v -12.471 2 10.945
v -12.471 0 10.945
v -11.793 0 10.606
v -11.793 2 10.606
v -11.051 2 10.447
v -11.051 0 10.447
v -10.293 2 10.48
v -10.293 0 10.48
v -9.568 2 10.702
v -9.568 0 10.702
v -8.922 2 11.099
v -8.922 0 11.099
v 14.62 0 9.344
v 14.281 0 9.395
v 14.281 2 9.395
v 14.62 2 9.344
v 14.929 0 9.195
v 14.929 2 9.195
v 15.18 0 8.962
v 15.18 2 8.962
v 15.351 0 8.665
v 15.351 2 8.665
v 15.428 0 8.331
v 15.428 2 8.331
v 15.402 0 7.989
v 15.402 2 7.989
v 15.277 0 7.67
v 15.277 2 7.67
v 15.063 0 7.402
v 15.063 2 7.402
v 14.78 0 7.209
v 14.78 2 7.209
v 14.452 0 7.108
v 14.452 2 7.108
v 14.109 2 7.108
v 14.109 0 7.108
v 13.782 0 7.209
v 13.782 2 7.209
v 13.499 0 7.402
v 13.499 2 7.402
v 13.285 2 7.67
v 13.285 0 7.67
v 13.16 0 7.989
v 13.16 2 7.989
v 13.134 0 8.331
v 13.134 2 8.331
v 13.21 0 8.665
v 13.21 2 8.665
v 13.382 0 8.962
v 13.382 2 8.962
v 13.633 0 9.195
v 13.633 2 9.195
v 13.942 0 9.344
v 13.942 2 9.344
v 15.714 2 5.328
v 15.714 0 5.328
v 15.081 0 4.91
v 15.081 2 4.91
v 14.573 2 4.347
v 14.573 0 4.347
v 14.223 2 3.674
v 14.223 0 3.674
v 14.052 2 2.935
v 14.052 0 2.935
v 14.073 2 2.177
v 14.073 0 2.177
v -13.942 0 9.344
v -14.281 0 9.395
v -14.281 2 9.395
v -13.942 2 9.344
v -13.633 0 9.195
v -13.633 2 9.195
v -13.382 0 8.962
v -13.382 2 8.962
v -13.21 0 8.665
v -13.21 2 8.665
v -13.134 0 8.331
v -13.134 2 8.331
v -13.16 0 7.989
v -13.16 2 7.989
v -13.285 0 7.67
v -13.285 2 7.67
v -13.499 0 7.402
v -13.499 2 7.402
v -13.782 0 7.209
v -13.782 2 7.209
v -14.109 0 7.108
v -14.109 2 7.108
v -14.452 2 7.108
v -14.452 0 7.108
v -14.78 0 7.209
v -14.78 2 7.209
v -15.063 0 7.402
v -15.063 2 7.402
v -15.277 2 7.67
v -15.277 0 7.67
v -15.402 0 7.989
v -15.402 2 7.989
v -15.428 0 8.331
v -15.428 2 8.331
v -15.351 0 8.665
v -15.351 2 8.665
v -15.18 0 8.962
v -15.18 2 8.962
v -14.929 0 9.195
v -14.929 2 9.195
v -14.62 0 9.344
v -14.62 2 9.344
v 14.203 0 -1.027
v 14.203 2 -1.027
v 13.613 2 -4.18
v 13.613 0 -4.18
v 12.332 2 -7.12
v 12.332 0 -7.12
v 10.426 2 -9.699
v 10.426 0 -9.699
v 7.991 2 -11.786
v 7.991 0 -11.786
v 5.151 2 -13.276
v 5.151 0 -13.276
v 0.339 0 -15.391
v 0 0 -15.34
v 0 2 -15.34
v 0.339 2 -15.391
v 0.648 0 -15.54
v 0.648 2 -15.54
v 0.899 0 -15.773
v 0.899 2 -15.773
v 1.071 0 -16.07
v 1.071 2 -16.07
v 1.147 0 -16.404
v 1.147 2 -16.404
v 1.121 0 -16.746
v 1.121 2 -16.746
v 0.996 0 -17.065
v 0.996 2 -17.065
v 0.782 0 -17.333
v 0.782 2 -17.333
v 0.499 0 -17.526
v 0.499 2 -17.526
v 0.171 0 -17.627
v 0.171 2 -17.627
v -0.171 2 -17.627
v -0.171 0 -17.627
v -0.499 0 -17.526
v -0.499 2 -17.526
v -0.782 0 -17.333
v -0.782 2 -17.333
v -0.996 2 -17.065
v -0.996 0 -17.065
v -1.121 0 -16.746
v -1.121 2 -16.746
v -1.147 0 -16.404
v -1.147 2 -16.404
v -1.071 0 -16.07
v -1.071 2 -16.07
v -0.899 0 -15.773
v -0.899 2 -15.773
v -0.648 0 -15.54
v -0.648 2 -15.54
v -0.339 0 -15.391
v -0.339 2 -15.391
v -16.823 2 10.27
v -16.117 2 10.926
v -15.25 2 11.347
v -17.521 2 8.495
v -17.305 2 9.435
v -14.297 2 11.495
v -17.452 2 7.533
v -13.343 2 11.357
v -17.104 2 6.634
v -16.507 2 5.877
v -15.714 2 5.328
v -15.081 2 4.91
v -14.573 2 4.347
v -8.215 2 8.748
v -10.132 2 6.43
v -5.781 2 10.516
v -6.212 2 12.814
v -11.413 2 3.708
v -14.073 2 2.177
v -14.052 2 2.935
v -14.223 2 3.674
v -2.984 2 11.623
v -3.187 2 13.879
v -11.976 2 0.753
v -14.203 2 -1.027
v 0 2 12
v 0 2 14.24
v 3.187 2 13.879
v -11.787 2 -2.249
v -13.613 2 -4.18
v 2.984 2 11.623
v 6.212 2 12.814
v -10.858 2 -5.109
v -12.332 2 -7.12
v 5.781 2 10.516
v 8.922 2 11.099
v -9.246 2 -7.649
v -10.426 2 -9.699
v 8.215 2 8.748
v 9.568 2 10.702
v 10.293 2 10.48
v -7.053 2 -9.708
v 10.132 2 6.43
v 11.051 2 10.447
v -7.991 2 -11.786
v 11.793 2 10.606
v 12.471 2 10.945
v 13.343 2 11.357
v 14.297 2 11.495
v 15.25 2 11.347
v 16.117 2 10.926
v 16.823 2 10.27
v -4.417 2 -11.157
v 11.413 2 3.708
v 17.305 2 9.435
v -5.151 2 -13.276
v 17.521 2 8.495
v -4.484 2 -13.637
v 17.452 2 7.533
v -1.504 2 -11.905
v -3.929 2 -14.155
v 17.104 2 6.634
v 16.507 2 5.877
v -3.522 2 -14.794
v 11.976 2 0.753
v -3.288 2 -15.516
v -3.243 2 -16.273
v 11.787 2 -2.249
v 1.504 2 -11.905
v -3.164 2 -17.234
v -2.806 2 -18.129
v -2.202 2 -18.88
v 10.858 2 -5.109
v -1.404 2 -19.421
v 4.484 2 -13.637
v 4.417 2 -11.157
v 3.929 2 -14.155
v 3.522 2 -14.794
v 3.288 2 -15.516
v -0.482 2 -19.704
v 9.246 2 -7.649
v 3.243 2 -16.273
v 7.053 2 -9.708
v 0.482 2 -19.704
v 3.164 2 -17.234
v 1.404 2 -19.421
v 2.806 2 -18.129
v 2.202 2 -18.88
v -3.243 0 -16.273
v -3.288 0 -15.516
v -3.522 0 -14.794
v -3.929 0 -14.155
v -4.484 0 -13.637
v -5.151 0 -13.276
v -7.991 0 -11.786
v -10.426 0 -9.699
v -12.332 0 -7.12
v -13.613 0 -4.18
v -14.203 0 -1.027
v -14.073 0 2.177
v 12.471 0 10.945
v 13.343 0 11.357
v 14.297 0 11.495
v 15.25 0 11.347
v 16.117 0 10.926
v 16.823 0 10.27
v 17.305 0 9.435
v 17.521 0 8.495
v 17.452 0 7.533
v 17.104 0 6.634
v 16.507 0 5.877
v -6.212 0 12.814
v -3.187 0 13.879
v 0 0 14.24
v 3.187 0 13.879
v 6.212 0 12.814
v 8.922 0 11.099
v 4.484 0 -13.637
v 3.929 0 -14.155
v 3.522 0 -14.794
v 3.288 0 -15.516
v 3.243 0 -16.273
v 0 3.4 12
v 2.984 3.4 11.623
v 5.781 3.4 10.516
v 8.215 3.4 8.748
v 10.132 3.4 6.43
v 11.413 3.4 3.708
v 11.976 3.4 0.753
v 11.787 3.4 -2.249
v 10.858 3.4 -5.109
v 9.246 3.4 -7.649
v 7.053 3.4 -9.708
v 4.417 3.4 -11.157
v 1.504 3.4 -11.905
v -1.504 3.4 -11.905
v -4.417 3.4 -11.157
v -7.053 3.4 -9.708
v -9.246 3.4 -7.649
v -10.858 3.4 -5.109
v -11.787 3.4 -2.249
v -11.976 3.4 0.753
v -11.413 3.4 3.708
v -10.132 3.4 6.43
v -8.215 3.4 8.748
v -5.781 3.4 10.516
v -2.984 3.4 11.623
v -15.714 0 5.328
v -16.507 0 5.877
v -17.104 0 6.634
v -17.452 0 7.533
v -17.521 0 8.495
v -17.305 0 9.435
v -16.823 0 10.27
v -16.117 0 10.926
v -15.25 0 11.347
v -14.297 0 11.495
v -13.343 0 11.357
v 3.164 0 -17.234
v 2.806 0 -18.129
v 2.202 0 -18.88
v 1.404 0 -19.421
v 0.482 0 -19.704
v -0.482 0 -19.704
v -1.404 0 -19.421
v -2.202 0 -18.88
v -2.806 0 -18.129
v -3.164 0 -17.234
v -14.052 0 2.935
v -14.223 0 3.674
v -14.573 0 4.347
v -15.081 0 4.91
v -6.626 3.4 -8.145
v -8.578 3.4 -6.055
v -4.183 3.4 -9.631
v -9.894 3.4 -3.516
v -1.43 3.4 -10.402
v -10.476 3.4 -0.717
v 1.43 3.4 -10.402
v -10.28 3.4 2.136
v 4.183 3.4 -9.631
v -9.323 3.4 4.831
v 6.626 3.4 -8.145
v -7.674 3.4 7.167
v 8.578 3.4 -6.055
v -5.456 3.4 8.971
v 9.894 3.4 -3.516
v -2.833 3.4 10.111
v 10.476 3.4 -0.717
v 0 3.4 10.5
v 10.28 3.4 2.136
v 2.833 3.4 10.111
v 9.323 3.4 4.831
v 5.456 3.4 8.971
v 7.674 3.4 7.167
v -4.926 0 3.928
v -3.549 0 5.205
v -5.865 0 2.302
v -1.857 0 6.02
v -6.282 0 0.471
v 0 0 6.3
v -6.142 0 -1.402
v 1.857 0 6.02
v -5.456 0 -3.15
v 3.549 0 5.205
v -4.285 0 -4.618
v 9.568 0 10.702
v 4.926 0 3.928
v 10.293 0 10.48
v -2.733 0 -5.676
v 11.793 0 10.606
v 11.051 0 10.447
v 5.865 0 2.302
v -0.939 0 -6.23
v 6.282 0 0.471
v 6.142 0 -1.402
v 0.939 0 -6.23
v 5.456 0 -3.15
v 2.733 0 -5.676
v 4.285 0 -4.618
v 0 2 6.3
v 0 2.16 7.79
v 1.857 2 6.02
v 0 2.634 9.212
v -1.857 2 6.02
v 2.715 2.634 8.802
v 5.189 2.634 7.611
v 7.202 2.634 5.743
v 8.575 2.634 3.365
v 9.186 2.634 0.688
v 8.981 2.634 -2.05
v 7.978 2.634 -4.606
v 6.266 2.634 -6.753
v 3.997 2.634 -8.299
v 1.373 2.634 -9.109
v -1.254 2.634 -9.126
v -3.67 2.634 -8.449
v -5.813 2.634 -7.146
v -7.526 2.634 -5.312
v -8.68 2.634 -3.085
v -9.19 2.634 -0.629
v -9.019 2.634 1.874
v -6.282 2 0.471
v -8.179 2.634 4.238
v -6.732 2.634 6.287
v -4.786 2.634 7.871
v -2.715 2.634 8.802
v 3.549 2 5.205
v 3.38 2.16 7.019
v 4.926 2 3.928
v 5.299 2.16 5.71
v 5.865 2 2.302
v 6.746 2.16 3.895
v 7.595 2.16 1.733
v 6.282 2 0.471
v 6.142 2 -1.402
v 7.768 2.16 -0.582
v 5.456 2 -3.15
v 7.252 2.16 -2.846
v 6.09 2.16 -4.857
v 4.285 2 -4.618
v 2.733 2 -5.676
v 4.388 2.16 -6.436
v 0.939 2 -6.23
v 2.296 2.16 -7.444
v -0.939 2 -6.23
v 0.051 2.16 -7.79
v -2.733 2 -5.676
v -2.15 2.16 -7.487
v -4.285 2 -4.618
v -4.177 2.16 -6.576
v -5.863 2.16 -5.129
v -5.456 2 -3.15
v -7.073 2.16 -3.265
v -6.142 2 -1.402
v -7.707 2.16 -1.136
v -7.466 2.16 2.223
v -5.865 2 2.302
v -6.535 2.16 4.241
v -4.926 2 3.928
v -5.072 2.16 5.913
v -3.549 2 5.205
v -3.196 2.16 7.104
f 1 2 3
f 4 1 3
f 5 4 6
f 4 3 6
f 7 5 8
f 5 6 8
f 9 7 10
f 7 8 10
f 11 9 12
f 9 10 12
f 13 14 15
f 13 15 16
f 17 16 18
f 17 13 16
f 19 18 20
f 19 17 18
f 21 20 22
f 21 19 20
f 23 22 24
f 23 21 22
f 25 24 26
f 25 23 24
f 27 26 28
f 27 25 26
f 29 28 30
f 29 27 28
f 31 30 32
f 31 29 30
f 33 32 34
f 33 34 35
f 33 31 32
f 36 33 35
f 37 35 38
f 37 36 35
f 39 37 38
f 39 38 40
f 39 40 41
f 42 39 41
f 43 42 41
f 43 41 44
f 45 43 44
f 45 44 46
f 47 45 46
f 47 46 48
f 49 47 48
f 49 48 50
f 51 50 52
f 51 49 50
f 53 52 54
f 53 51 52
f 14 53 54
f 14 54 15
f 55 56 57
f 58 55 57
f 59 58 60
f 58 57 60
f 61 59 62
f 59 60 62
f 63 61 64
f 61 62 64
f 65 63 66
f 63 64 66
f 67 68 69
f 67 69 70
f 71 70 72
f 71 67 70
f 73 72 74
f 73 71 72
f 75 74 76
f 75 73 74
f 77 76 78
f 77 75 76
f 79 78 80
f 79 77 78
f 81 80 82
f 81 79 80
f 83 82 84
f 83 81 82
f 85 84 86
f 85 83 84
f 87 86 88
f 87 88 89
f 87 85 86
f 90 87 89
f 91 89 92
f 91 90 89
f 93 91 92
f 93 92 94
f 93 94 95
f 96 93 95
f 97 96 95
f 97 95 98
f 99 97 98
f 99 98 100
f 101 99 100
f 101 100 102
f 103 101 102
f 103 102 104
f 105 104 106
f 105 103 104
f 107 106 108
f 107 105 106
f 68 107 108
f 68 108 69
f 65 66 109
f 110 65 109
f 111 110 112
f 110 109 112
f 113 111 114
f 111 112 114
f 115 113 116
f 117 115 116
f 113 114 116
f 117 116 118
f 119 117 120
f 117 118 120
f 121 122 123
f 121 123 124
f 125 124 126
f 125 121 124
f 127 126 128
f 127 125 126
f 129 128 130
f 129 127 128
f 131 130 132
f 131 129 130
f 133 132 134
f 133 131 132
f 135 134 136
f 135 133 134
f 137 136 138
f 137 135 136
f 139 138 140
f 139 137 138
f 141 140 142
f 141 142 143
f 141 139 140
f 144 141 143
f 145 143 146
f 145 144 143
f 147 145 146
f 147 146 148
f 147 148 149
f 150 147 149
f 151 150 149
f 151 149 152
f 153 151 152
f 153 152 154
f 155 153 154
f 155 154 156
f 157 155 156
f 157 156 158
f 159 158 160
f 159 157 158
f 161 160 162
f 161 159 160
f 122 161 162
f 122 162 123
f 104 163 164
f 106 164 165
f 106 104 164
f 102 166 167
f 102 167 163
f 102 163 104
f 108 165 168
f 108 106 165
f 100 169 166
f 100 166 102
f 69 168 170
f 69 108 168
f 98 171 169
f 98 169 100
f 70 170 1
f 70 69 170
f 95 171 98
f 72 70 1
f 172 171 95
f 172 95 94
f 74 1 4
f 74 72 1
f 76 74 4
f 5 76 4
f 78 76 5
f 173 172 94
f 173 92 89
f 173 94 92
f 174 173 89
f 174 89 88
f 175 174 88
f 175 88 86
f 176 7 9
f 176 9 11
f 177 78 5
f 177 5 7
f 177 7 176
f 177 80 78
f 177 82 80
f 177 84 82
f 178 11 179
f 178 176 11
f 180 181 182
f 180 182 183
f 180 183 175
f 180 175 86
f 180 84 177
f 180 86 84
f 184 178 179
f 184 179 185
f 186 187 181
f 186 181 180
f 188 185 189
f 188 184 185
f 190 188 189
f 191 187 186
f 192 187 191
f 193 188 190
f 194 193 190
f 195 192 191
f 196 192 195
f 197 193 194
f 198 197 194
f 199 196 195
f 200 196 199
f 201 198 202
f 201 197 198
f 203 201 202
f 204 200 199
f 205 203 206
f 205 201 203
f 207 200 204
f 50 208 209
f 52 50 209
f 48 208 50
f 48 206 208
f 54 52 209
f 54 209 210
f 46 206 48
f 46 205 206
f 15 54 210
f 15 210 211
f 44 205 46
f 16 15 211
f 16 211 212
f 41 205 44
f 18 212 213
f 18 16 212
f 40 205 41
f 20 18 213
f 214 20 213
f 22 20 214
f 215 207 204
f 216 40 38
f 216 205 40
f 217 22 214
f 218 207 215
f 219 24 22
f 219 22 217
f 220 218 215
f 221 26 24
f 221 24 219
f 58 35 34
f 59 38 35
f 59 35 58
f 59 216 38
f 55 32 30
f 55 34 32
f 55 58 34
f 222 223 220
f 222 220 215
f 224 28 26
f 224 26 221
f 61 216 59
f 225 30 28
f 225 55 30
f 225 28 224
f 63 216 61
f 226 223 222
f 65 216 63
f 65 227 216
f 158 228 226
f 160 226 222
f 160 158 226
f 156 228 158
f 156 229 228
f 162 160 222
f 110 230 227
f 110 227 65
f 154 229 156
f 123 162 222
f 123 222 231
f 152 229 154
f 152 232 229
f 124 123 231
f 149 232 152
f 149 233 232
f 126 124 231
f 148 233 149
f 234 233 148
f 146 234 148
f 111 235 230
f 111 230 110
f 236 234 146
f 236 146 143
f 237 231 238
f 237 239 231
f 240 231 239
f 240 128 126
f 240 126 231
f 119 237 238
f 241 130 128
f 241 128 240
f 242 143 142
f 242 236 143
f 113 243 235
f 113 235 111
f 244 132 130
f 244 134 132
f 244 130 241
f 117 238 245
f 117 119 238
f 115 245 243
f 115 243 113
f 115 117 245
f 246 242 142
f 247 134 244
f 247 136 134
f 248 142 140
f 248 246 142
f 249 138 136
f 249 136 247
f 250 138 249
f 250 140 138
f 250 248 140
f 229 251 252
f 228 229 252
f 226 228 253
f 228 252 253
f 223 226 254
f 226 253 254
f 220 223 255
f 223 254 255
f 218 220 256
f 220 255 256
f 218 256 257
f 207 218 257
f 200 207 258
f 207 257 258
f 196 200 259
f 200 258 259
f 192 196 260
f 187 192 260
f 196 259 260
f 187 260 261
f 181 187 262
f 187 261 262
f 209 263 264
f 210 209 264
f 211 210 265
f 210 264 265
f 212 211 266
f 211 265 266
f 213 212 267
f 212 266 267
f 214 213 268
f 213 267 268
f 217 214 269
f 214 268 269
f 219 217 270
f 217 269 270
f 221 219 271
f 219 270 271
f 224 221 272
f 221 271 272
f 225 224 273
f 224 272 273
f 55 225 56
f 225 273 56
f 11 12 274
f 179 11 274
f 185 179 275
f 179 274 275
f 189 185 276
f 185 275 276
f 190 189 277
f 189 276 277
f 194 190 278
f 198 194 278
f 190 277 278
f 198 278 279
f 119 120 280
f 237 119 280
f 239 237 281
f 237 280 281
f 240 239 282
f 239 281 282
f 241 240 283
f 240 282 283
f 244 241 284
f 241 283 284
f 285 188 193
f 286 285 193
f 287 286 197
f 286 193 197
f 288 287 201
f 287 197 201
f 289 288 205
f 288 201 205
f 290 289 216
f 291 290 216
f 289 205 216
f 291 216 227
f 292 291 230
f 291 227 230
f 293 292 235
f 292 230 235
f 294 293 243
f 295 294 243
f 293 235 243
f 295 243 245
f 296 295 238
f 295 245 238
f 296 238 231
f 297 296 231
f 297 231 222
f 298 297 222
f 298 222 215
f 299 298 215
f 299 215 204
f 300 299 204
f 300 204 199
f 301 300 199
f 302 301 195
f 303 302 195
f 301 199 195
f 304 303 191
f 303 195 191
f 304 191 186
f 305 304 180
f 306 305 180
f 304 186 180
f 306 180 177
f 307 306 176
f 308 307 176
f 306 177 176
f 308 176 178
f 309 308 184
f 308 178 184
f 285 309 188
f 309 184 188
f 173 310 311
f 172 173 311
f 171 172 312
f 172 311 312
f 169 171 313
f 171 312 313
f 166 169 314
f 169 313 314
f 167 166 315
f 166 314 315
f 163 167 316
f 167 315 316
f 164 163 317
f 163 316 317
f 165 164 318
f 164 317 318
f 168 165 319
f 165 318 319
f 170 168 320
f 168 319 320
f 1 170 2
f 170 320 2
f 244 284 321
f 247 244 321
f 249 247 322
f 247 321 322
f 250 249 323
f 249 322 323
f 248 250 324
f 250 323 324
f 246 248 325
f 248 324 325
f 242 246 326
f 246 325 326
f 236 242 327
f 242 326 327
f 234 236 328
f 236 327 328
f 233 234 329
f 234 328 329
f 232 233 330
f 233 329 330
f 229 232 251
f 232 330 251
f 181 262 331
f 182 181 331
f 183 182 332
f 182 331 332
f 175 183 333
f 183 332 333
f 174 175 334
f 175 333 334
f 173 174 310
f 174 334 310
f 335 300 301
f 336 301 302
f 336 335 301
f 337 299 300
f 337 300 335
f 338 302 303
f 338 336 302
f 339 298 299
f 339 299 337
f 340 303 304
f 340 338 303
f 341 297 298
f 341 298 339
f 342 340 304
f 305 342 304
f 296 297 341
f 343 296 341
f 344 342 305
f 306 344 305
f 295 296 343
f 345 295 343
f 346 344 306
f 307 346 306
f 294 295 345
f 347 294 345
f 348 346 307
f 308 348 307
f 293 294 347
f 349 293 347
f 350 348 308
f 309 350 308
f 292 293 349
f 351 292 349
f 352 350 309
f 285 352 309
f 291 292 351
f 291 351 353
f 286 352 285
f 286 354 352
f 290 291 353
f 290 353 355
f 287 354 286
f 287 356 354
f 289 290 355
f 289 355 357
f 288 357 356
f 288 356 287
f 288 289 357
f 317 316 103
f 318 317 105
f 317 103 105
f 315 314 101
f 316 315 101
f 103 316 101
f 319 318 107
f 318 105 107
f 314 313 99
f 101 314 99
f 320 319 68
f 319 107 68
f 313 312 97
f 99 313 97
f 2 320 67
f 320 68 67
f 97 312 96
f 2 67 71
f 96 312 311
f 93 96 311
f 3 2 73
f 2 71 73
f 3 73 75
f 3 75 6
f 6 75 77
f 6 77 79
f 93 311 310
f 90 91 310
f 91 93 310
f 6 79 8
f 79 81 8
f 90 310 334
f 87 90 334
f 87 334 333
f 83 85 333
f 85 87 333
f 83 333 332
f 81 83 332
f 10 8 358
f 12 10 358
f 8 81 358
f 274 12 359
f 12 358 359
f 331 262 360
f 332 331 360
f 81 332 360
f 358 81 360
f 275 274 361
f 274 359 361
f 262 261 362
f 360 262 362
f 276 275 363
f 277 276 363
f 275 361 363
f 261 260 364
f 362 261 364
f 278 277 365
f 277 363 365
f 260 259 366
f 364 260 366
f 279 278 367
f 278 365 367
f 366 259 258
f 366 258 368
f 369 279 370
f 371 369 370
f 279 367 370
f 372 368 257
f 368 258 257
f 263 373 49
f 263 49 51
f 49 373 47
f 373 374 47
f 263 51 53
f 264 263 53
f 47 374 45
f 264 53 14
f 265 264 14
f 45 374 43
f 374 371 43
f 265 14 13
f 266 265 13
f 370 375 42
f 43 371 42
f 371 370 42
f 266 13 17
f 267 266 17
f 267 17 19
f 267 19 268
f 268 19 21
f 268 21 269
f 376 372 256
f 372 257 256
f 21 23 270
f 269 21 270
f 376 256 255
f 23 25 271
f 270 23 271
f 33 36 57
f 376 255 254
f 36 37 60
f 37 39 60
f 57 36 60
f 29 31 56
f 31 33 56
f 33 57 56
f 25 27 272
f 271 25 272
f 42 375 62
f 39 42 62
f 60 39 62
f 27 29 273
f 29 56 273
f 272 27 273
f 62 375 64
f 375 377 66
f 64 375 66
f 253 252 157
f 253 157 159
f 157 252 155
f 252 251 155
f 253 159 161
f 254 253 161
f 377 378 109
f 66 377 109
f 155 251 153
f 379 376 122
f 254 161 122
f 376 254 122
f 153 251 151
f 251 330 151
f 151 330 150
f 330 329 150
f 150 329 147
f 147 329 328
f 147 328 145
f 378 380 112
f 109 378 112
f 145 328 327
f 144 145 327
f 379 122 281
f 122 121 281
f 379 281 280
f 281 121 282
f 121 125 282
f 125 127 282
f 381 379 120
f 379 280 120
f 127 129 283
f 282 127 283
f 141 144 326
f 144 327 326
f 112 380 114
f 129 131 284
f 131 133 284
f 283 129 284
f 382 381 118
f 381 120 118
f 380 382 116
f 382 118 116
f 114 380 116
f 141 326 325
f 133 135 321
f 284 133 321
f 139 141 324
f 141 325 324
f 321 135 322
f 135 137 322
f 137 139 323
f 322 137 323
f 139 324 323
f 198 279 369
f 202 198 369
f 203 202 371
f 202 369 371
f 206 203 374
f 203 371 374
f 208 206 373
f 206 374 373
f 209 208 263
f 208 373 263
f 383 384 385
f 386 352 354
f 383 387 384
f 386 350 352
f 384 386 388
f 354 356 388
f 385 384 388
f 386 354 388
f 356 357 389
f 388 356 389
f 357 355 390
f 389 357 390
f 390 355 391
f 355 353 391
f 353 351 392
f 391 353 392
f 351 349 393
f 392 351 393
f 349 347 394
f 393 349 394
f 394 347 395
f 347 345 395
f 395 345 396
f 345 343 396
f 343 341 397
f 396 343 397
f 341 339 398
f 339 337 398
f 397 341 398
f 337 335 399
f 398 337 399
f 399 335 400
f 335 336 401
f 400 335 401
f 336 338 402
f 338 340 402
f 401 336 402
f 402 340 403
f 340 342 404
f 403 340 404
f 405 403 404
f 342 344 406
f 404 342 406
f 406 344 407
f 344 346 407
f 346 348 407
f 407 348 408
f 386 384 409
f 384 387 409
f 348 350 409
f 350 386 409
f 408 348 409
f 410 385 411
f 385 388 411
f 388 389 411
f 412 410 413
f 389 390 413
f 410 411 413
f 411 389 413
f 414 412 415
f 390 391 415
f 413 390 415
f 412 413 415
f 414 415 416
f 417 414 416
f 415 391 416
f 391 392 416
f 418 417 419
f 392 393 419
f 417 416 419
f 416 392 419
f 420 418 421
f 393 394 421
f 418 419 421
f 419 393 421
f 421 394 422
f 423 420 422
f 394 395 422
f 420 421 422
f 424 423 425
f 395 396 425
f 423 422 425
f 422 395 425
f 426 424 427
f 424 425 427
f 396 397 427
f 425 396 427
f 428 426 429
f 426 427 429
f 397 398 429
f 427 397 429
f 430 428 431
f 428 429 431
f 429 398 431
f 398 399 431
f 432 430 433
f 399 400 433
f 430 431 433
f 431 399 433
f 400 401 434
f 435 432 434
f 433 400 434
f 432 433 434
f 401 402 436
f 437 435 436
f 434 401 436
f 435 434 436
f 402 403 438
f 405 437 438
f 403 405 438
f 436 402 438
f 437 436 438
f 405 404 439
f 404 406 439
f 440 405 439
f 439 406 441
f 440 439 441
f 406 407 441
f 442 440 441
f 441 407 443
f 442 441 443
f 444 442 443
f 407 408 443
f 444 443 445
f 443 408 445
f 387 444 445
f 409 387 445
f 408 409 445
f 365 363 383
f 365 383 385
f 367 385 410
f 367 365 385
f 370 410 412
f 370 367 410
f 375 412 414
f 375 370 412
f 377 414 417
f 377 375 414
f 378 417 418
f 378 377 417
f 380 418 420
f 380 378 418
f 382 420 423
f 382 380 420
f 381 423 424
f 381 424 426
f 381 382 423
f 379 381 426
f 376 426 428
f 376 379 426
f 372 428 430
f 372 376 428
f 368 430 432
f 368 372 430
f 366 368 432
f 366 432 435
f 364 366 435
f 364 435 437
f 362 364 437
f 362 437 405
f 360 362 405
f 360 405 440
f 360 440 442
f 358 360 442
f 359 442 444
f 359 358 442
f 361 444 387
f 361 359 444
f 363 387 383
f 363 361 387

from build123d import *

# Parameters (mm, degrees)
SKETCH_1_R      = 1.15
SKETCH_1_R_2    = 6.3
EXTRUDE_1_DEPTH = 2
SKETCH_2_R      = 12
SKETCH_2_R_2    = 10.5
EXTRUDE_2_DEPTH = 1.4
FILLET_1_R      = 7


with BuildPart() as part:
    # Эскиз1 → Бобышка-Вытянуть1 (new body)
    with BuildSketch(Plane(origin=(0, 0, 0), x_dir=(1, 0, 0), z_dir=(0, 1, 0))):
        with BuildLine():
            ThreePointArc((-5.15088911, 13.27576519), (-12.33220175, 7.12), (-14.072594464, -2.177081774))
            ThreePointArc((-14.072594464, -2.177081774), (-14.376715993, -4.021792929), (-15.714174027, -5.328183054))
            ThreePointArc((-15.714174027, -5.328183054), (-17.095341471, -9.87), (-12.471428894, -10.94478238))
            ThreePointArc((-12.471428894, -10.94478238), (-10.671332842, -10.439704809), (-8.921705354, -11.098683416))
            ThreePointArc((-8.921705354, -11.098683416), (0, -14.24), (8.921705354, -11.098683416))
            ThreePointArc((8.921705354, -11.098683416), (10.671332842, -10.439704809), (12.471428894, -10.94478238))
            ThreePointArc((12.471428894, -10.94478238), (17.095341471, -9.87), (15.714174027, -5.328183054))
            ThreePointArc((15.714174027, -5.328183054), (14.376715993, -4.021792929), (14.072594464, -2.177081774))
            ThreePointArc((14.072594464, -2.177081774), (12.33220175, 7.12), (5.15088911, 13.27576519))
            ThreePointArc((5.15088911, 13.27576519), (3.705383152, 14.461497738), (3.242745133, 16.272965434))
            ThreePointArc((3.242745133, 16.272965434), (0, 19.74), (-3.242745133, 16.272965434))
            ThreePointArc((-3.242745133, 16.272965434), (-3.705383152, 14.461497738), (-5.15088911, 13.27576519))
        make_face()
        with Locations(Location((0, 16.49, 0), (0, 0, 270))):
            Circle(SKETCH_1_R, mode=Mode.SUBTRACT)
        with Locations(Location((0, 0, 0), (0, 0, 270))):
            Circle(SKETCH_1_R_2, mode=Mode.SUBTRACT)
        with Locations(Location((14.280758908, -8.245, 0), (0, 0, 270))):
            Circle(SKETCH_1_R, mode=Mode.SUBTRACT)
        with Locations(Location((-14.280758908, -8.245, 0), (0, 0, 270))):
            Circle(SKETCH_1_R, mode=Mode.SUBTRACT)
    extrude(amount=EXTRUDE_1_DEPTH)

    # Эскиз2 → Бобышка-Вытянуть2 (add)
    with BuildSketch(Plane(origin=(0, 2, 0), x_dir=(1, 0, 0), z_dir=(0, 1, 0))):
        with Locations(Location((0, 0, 0), (0, 0, 270))):
            Circle(SKETCH_2_R)
        with Locations(Location((0, 0, 0), (0, 0, 270))):
            Circle(SKETCH_2_R_2, mode=Mode.SUBTRACT)
    extrude(amount=EXTRUDE_2_DEPTH)

    # Скругление1
    # the kernel refuses this fillet: 7 mm, written as the material it adds along each edge
    with BuildSketch(Plane(origin=(0, 2, 0), x_dir=(0, 0, 1), z_dir=(-1, 0, 0))) as fillet_1_piece_1:
        with BuildLine():
            CenterArc((6.3, 7), FILLET_1_R, 270, 36.869897646)
            Line((10.5, 1.4), (10.5, 0))
            Line((10.5, 0), (6.3, 0))
        make_face()
    revolve(axis=Axis((0, 2, 0), (0, 1, 0)))


solid = part.part
